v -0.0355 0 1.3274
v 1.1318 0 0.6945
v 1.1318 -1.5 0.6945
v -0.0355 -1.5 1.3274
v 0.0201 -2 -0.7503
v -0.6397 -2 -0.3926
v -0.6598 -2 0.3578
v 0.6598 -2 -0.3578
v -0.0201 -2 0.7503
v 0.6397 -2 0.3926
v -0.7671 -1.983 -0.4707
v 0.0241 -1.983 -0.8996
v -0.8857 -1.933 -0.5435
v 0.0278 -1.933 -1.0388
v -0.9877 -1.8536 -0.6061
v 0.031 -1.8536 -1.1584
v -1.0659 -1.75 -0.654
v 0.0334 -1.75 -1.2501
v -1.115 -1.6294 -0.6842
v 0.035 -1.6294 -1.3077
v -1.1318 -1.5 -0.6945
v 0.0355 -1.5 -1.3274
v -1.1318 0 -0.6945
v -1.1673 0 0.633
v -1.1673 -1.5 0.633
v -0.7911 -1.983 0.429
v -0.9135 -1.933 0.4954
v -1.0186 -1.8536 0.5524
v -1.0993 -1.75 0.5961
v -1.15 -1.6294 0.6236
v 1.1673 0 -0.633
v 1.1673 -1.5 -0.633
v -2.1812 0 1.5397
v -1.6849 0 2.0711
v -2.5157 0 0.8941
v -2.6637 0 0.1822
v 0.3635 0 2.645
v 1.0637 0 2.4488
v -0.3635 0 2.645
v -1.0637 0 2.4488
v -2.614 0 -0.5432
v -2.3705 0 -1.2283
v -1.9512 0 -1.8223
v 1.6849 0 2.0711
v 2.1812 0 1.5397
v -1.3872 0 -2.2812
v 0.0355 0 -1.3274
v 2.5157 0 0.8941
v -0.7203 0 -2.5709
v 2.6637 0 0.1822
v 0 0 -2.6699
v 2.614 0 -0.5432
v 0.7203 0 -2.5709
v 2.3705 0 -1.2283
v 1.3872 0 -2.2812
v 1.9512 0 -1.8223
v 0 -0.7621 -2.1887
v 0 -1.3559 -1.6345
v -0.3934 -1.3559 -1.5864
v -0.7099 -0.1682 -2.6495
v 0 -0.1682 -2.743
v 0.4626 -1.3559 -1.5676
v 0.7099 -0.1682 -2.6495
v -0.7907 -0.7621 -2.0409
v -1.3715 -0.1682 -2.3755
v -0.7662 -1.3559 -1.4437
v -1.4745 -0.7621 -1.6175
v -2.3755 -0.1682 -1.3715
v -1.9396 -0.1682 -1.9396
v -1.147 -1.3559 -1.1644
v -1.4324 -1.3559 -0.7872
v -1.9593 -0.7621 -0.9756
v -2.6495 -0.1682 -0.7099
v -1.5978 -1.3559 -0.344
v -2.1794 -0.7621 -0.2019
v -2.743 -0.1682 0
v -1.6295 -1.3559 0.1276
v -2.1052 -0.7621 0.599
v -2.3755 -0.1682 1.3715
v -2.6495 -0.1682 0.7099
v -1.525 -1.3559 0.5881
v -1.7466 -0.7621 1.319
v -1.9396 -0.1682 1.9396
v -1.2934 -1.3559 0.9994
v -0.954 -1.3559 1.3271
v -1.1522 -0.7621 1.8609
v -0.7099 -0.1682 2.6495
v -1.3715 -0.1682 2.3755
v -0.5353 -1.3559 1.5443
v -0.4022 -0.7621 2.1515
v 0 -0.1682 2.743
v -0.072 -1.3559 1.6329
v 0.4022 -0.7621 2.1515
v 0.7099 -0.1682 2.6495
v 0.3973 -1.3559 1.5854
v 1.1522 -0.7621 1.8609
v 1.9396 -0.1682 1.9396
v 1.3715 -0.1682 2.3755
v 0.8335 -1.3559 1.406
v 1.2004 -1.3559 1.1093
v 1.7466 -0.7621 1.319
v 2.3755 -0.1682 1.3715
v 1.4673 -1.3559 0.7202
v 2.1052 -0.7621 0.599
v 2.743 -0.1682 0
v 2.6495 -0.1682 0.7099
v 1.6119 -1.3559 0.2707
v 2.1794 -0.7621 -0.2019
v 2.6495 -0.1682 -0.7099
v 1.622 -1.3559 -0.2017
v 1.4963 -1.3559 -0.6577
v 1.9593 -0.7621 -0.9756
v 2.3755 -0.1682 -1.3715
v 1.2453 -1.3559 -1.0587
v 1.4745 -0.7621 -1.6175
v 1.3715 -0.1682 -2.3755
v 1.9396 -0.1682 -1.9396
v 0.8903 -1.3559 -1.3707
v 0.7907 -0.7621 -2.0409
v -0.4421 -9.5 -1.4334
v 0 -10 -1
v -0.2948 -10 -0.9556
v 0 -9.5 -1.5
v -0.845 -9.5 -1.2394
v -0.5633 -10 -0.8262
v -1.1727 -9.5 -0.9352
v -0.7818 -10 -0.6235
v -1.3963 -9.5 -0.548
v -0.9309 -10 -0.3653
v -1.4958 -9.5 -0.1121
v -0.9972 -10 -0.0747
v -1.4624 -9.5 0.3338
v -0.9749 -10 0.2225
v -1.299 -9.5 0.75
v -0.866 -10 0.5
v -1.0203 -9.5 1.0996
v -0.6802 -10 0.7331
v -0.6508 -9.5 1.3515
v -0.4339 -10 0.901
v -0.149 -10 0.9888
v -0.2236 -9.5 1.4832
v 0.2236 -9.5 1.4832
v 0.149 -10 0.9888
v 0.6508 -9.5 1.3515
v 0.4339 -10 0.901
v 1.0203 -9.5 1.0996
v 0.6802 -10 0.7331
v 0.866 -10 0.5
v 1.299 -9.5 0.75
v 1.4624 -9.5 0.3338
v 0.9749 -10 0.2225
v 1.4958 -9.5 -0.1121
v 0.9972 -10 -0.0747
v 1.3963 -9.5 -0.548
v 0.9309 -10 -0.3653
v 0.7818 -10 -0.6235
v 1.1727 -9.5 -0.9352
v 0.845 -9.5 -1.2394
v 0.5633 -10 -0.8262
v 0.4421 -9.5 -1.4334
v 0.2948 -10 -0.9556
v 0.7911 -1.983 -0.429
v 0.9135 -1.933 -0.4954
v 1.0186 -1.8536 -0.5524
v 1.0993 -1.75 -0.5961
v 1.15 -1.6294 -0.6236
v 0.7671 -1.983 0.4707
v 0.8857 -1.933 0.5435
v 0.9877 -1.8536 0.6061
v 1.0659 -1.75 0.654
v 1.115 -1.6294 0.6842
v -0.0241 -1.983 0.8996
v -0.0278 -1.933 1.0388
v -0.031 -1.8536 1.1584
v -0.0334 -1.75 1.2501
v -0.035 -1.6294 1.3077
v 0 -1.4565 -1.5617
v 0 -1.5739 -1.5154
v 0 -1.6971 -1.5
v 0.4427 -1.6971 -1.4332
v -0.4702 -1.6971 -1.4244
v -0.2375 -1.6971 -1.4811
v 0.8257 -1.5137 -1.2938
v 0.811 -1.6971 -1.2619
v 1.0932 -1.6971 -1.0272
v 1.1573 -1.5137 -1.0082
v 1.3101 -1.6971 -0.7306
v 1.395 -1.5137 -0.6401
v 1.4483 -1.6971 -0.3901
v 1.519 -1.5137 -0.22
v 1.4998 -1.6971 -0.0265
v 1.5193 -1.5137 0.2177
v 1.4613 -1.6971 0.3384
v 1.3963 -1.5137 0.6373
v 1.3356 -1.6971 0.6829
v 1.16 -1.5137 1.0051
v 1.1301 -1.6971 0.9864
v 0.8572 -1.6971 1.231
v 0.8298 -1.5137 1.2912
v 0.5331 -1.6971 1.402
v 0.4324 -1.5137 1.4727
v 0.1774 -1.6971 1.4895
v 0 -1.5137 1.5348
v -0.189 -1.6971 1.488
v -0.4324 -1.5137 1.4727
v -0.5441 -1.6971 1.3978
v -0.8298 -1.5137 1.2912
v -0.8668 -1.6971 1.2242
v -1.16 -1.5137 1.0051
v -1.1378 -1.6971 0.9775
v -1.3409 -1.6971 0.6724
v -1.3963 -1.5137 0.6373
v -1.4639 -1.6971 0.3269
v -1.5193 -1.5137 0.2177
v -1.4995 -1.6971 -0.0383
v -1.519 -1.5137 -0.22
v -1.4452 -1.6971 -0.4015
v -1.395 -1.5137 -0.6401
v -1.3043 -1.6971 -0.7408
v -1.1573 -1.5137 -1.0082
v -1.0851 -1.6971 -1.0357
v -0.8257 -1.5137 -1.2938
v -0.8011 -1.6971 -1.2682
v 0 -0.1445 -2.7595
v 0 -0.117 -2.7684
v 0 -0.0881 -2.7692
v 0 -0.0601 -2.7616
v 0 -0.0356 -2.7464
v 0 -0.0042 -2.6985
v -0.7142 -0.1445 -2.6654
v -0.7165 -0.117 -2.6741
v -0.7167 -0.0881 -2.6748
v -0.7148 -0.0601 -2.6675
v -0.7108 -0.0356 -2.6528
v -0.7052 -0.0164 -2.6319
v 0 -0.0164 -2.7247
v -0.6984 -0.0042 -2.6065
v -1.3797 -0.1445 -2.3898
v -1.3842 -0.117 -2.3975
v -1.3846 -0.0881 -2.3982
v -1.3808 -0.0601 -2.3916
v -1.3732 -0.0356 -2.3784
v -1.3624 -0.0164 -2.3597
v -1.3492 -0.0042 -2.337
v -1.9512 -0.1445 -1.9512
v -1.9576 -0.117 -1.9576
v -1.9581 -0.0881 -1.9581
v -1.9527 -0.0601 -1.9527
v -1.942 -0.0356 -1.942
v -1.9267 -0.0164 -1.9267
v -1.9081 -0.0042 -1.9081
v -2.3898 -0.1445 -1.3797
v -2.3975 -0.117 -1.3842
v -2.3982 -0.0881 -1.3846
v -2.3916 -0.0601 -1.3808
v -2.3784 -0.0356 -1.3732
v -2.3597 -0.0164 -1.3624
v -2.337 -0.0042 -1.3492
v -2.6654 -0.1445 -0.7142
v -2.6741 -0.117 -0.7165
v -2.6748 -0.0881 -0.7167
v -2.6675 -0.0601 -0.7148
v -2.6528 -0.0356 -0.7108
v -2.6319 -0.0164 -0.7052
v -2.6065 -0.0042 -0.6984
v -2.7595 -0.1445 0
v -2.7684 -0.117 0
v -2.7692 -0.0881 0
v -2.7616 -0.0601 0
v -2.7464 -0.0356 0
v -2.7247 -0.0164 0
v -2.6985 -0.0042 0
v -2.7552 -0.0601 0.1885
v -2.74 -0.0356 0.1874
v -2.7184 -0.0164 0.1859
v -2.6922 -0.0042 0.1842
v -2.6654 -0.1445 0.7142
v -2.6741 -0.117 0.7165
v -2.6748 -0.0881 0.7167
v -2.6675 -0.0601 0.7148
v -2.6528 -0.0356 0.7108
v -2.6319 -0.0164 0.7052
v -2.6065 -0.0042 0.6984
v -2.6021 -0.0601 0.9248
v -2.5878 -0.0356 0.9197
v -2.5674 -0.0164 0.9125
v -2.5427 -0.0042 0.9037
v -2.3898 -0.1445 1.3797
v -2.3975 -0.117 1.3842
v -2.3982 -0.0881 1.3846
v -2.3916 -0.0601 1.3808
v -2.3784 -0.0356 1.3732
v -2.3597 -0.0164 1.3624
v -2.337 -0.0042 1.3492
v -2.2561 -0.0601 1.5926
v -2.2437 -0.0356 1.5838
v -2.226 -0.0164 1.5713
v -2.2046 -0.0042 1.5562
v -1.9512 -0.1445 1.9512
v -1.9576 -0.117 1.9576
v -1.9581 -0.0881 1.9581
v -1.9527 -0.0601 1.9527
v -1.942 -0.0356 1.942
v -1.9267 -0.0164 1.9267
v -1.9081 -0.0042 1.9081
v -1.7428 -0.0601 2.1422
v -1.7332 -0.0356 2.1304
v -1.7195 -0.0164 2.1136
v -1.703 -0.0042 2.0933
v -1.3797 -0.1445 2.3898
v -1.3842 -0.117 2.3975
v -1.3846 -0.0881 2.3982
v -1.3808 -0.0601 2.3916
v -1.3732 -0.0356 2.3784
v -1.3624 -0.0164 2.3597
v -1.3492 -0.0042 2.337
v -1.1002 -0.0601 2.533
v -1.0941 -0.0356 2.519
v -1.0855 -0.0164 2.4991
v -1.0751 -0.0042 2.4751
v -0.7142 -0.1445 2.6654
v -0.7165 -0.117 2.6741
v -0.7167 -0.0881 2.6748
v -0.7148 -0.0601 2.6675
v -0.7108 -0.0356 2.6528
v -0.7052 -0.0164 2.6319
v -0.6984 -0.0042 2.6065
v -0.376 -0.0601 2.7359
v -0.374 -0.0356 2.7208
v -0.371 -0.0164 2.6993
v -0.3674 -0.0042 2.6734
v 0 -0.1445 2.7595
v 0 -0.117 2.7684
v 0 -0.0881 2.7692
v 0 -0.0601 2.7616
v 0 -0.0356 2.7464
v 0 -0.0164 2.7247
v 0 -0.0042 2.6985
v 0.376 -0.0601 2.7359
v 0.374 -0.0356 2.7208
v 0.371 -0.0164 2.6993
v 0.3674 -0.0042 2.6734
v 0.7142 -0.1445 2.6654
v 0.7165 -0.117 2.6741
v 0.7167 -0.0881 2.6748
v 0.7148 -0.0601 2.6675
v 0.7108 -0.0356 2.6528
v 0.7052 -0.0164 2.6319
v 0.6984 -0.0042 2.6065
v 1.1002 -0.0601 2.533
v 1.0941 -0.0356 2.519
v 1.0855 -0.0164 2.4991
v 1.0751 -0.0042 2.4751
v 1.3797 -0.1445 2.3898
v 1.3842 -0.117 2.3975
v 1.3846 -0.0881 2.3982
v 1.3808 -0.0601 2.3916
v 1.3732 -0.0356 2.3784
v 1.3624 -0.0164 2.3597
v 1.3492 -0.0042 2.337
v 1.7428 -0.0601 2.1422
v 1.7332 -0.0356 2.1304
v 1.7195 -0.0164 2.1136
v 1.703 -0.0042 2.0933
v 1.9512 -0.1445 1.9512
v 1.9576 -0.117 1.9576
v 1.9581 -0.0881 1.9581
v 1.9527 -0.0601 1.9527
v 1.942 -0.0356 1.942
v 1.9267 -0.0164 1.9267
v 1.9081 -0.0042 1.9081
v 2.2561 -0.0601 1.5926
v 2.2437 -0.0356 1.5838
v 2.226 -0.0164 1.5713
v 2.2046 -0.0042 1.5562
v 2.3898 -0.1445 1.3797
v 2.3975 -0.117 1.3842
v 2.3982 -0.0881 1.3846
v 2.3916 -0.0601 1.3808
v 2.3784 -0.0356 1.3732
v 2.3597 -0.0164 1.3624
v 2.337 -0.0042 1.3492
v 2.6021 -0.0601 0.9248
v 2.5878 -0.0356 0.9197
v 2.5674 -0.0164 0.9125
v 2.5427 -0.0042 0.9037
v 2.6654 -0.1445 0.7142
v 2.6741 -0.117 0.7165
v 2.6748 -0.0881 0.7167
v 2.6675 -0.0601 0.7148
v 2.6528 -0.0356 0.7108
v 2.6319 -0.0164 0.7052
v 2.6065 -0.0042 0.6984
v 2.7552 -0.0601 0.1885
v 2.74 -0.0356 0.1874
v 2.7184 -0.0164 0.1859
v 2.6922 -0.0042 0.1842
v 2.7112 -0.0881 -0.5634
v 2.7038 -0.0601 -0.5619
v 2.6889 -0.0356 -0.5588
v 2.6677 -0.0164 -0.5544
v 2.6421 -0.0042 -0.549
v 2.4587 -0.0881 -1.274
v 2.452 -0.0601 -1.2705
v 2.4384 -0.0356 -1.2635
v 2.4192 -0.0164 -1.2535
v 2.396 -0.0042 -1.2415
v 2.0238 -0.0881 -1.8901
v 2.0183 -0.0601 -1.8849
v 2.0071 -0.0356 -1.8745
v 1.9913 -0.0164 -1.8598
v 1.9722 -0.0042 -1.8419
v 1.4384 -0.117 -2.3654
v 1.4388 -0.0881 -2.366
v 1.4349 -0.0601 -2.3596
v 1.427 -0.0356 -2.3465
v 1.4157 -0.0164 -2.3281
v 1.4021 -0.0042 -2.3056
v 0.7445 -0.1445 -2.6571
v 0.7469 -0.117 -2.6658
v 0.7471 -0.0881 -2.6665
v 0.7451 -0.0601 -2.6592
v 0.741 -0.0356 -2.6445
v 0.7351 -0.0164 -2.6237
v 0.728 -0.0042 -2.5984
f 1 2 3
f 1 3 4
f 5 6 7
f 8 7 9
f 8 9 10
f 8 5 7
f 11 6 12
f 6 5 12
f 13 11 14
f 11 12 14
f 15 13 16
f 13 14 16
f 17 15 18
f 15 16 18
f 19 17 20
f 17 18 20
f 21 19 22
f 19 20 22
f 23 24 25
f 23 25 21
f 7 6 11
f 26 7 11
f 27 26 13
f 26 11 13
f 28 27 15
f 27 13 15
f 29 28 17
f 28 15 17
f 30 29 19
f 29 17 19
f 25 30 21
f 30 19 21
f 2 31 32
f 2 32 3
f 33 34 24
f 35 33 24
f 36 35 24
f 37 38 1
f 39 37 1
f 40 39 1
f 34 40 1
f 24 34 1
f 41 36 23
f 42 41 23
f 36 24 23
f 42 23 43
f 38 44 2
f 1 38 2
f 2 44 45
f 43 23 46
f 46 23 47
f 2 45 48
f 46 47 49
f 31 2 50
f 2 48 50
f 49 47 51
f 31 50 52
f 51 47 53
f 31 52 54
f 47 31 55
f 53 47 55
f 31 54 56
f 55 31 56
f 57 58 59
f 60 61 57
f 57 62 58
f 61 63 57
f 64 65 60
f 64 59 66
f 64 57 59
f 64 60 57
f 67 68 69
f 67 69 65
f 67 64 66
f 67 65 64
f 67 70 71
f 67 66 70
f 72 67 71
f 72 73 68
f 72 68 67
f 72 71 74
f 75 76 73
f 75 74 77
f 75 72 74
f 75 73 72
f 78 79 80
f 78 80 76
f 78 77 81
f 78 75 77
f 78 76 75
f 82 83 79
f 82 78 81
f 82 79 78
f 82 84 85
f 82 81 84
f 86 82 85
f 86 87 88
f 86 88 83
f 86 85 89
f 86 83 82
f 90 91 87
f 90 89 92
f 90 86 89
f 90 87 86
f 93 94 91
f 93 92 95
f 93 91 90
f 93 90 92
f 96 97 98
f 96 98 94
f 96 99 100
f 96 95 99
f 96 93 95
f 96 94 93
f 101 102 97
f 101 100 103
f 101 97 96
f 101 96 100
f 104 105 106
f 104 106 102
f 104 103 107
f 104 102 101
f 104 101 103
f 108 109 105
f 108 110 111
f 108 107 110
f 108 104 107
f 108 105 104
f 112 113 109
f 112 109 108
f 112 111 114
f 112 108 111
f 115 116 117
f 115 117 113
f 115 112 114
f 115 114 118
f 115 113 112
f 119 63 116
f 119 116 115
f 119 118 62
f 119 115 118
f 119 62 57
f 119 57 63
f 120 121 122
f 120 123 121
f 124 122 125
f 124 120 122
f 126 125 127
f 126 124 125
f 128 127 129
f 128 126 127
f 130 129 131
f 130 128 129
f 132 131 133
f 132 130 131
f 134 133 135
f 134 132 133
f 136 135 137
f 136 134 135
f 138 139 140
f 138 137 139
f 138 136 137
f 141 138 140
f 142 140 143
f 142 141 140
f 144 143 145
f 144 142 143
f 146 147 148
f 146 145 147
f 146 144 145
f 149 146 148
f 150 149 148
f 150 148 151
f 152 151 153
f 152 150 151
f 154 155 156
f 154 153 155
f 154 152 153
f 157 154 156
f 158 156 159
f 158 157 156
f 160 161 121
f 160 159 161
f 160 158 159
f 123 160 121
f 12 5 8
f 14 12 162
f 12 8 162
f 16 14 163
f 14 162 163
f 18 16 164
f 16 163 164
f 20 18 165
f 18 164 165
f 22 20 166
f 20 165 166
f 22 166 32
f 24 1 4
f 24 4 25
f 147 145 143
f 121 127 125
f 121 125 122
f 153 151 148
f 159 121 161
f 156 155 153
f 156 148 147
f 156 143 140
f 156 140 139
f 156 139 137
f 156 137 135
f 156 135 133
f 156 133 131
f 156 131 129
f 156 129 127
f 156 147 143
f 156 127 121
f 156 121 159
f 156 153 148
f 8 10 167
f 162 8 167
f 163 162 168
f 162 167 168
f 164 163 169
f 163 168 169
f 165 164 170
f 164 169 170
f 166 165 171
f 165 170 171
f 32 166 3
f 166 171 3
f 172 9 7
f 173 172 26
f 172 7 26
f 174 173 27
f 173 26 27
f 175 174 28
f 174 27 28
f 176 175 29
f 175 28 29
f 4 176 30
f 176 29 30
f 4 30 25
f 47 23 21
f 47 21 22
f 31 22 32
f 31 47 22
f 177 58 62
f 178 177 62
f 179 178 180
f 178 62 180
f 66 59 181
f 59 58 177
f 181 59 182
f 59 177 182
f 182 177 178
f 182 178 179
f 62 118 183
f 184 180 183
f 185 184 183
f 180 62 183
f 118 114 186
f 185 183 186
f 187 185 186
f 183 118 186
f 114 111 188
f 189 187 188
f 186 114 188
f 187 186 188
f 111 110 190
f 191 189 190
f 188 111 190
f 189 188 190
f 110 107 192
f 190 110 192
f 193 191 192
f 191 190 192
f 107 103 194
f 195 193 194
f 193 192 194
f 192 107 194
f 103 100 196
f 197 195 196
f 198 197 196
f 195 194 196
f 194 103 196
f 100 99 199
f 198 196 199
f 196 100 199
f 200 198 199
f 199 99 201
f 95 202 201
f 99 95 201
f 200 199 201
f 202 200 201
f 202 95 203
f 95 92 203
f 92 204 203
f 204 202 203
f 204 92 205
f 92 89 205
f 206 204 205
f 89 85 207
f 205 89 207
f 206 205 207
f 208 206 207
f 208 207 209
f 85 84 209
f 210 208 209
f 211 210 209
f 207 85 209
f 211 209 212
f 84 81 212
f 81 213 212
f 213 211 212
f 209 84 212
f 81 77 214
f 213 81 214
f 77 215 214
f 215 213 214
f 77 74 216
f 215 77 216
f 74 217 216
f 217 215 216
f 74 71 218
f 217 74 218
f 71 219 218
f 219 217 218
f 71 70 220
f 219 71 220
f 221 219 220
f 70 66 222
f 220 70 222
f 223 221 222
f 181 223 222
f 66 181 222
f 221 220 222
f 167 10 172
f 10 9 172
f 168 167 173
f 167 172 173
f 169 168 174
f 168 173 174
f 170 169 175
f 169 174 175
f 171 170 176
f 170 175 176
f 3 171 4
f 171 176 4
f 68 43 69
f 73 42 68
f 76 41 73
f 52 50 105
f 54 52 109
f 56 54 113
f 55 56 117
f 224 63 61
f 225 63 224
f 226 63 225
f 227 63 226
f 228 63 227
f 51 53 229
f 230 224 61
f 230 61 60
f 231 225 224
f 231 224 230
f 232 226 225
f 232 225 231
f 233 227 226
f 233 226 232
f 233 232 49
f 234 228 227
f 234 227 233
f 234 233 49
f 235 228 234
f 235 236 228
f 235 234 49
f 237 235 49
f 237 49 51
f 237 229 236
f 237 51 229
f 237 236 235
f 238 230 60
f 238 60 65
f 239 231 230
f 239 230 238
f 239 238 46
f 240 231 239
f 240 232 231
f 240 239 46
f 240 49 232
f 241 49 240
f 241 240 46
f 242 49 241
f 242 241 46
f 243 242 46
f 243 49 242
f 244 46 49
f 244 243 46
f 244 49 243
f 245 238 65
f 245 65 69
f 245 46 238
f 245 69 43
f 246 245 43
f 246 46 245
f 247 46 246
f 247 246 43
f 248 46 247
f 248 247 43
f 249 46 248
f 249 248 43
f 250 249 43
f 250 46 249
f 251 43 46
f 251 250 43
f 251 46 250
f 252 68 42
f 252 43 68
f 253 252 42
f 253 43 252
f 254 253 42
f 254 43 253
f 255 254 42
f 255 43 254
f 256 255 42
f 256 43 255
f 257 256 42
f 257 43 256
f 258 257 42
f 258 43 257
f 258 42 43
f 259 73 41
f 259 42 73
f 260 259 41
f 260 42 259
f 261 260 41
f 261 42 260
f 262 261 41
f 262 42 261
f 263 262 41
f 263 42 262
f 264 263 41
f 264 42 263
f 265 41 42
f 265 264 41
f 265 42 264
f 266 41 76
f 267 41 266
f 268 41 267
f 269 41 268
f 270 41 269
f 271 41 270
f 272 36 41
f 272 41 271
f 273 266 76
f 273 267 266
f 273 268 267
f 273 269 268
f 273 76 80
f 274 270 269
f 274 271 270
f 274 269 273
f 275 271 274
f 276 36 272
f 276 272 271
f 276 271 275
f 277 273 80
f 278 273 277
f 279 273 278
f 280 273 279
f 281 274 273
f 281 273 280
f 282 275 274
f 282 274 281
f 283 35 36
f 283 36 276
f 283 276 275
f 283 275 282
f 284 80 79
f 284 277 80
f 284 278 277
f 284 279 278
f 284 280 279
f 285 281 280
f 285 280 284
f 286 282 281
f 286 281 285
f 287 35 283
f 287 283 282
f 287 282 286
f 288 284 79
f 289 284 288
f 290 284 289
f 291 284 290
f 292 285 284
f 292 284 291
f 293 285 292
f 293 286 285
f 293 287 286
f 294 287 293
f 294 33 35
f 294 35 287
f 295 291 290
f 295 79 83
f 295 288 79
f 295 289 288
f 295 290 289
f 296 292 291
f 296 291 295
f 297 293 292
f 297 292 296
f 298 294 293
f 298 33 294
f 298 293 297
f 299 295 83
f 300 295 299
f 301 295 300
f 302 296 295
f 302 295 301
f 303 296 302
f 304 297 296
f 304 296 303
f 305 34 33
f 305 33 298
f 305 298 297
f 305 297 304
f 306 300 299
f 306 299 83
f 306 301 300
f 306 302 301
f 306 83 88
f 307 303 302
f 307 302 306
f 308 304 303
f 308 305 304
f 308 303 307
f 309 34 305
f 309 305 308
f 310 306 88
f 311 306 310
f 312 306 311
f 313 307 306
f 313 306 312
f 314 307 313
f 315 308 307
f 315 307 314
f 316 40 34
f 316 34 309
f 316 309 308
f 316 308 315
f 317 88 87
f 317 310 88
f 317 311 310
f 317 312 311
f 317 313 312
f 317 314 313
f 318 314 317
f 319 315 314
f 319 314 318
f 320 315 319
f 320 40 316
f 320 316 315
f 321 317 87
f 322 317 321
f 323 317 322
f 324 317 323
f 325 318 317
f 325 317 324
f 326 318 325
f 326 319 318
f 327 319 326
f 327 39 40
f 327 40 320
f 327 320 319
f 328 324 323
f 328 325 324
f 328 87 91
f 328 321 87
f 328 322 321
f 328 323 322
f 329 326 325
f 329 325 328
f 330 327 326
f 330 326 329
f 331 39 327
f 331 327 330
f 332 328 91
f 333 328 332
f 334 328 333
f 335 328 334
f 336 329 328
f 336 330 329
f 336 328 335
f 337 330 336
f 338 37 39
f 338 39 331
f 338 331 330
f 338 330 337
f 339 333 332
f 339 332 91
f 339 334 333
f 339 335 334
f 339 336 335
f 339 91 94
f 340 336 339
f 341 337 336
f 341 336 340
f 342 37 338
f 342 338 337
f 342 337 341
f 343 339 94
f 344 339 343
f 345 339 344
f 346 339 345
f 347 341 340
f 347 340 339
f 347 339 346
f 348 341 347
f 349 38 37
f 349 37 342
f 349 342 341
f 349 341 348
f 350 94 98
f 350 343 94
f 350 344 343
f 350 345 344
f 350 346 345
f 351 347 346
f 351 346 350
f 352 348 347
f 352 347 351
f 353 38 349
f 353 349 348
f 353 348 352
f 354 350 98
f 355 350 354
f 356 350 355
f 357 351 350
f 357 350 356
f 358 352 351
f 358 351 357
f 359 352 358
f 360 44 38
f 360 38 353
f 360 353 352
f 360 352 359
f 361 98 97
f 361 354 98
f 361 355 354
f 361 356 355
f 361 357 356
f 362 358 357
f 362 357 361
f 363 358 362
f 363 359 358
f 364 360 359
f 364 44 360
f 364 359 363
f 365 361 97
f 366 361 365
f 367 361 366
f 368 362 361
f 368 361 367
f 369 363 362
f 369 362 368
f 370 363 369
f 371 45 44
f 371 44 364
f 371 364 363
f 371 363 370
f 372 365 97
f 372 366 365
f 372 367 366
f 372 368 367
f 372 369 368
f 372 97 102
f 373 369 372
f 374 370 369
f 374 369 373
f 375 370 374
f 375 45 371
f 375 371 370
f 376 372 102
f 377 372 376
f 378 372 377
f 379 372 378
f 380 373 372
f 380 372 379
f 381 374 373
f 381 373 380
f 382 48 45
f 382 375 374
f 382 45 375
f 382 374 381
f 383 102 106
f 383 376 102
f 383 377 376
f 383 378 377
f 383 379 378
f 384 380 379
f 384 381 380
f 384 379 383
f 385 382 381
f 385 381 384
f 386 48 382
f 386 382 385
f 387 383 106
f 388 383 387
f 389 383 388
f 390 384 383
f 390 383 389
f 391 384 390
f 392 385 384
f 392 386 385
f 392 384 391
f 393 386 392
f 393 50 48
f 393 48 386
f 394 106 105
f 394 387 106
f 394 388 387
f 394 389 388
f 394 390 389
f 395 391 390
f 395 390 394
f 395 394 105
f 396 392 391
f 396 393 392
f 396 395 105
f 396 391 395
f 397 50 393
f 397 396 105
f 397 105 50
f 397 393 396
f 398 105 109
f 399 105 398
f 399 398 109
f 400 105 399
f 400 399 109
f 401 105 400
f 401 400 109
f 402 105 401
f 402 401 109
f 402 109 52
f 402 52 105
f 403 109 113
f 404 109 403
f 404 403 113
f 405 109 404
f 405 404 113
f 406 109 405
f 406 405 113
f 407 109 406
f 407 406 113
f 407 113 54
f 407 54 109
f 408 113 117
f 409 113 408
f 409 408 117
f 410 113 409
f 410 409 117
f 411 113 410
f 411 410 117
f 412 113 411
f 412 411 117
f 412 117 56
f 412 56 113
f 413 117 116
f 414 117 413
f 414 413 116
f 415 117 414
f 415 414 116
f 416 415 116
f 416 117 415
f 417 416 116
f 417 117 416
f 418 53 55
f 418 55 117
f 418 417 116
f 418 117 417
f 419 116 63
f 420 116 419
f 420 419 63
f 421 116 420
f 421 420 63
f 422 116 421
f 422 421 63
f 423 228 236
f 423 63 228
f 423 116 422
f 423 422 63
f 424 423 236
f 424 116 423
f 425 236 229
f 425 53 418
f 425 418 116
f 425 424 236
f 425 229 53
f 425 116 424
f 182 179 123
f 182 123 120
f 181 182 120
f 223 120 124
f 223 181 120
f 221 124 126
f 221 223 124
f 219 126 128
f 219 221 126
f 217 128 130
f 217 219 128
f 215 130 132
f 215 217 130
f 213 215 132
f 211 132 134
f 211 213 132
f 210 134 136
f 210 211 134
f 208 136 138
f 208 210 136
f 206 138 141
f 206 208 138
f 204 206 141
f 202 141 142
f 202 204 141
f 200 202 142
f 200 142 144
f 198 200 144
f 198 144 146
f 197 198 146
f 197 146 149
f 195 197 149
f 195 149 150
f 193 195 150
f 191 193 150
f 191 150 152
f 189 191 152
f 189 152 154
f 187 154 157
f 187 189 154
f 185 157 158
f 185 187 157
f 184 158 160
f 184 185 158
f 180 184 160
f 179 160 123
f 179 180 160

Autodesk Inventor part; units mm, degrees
ref_plane "YZ Plane" through (0, 0, 0) normal (1, 0, 0) x (0, 1, 0)
ref_plane "XZ Plane" through (0, 0, 0) normal (0, 1, 0) x (-1, 0, 0)
ref_plane "XY Plane" through (0, 0, 0) normal (0, 0, 1) x (1, 0, 0)
sketch "Szkic2" plane through (0, 0, 0) normal (1, 0, 0) x (0, 1, 0)
  line L0 (0, -2.9) -> (0, 2.9)
  line L1 (-1.5, -1.5) -> (-1.5, 1.5)
  line L2 (-1.5, -1.5) -> (0, -2.9)
  line L3 (-1.5, 1.5) -> (0, 2.9)
  line L4 (0, 0) -> (-10, 0)
  line L5 (-10, 0) -> (-10, -1.5)
  line L6 (-10, -1.5) -> (-1.5, -1.5)
  dimension "d0" = 5.8
  dimension "d2" = 3
  dimension "d3" = 1.5
  dimension "d4" = 10
  dimension "d5" = 1.5
revolve "Obrót1" add sketch "Szkic2" angle 360 about axis through (0, 0, 0) along (0, -1, 0) contours L2 L1 L4 L0 | L6 L5 L4 L1
sketch "Szkic3" plane through (0, 0, 0) normal (0, 1, 0) x (1, 0, 0)
  line L0 (-1.1673, -0.633) -> (-1.1318, 0.6945)
  line L1 (-1.1318, 0.6945) -> (0.0355, 1.3274)
  line L2 (0.0355, 1.3274) -> (1.1673, 0.633)
  line L3 (1.1673, 0.633) -> (1.1318, -0.6945)
  line L4 (1.1318, -0.6945) -> (-0.0355, -1.3274)
  line L5 (-0.0355, -1.3274) -> (-1.1673, -0.633)
  point P0 (0, 0)
  point P1 (0, 0)
  dimension "d7" = 2.3
extrude "Wyciągnięcie proste1" cut sketch "Szkic3" against normal blind 2
fillet "Zaokrąglenie1" radius 0.5 6 edges at (-1.1496, -2, -0.0308) (-0.6014, -2, 0.9802) (-0.5482, -2, -1.011) (0.6014, -2, -0.9802) (0.5482, -2, 1.011) (1.1496, -2, 0.0308)
fillet "Zaokrąglenie2" radius 0.5 1 edges at (0, -1.5, 1.5)
fillet "Zaokrąglenie3" radius 0.1 1 edges at (0, 0, 2.9)
thread "Gwint1" size "M3x0.5" class "6g" standard "ANSI Metric M Profile" full length
chamfer "Faza1" distance 0.5 angle 45 1 edges at (0, -10, 1.5)
properties part number "Screw M3 10mm flat head"
